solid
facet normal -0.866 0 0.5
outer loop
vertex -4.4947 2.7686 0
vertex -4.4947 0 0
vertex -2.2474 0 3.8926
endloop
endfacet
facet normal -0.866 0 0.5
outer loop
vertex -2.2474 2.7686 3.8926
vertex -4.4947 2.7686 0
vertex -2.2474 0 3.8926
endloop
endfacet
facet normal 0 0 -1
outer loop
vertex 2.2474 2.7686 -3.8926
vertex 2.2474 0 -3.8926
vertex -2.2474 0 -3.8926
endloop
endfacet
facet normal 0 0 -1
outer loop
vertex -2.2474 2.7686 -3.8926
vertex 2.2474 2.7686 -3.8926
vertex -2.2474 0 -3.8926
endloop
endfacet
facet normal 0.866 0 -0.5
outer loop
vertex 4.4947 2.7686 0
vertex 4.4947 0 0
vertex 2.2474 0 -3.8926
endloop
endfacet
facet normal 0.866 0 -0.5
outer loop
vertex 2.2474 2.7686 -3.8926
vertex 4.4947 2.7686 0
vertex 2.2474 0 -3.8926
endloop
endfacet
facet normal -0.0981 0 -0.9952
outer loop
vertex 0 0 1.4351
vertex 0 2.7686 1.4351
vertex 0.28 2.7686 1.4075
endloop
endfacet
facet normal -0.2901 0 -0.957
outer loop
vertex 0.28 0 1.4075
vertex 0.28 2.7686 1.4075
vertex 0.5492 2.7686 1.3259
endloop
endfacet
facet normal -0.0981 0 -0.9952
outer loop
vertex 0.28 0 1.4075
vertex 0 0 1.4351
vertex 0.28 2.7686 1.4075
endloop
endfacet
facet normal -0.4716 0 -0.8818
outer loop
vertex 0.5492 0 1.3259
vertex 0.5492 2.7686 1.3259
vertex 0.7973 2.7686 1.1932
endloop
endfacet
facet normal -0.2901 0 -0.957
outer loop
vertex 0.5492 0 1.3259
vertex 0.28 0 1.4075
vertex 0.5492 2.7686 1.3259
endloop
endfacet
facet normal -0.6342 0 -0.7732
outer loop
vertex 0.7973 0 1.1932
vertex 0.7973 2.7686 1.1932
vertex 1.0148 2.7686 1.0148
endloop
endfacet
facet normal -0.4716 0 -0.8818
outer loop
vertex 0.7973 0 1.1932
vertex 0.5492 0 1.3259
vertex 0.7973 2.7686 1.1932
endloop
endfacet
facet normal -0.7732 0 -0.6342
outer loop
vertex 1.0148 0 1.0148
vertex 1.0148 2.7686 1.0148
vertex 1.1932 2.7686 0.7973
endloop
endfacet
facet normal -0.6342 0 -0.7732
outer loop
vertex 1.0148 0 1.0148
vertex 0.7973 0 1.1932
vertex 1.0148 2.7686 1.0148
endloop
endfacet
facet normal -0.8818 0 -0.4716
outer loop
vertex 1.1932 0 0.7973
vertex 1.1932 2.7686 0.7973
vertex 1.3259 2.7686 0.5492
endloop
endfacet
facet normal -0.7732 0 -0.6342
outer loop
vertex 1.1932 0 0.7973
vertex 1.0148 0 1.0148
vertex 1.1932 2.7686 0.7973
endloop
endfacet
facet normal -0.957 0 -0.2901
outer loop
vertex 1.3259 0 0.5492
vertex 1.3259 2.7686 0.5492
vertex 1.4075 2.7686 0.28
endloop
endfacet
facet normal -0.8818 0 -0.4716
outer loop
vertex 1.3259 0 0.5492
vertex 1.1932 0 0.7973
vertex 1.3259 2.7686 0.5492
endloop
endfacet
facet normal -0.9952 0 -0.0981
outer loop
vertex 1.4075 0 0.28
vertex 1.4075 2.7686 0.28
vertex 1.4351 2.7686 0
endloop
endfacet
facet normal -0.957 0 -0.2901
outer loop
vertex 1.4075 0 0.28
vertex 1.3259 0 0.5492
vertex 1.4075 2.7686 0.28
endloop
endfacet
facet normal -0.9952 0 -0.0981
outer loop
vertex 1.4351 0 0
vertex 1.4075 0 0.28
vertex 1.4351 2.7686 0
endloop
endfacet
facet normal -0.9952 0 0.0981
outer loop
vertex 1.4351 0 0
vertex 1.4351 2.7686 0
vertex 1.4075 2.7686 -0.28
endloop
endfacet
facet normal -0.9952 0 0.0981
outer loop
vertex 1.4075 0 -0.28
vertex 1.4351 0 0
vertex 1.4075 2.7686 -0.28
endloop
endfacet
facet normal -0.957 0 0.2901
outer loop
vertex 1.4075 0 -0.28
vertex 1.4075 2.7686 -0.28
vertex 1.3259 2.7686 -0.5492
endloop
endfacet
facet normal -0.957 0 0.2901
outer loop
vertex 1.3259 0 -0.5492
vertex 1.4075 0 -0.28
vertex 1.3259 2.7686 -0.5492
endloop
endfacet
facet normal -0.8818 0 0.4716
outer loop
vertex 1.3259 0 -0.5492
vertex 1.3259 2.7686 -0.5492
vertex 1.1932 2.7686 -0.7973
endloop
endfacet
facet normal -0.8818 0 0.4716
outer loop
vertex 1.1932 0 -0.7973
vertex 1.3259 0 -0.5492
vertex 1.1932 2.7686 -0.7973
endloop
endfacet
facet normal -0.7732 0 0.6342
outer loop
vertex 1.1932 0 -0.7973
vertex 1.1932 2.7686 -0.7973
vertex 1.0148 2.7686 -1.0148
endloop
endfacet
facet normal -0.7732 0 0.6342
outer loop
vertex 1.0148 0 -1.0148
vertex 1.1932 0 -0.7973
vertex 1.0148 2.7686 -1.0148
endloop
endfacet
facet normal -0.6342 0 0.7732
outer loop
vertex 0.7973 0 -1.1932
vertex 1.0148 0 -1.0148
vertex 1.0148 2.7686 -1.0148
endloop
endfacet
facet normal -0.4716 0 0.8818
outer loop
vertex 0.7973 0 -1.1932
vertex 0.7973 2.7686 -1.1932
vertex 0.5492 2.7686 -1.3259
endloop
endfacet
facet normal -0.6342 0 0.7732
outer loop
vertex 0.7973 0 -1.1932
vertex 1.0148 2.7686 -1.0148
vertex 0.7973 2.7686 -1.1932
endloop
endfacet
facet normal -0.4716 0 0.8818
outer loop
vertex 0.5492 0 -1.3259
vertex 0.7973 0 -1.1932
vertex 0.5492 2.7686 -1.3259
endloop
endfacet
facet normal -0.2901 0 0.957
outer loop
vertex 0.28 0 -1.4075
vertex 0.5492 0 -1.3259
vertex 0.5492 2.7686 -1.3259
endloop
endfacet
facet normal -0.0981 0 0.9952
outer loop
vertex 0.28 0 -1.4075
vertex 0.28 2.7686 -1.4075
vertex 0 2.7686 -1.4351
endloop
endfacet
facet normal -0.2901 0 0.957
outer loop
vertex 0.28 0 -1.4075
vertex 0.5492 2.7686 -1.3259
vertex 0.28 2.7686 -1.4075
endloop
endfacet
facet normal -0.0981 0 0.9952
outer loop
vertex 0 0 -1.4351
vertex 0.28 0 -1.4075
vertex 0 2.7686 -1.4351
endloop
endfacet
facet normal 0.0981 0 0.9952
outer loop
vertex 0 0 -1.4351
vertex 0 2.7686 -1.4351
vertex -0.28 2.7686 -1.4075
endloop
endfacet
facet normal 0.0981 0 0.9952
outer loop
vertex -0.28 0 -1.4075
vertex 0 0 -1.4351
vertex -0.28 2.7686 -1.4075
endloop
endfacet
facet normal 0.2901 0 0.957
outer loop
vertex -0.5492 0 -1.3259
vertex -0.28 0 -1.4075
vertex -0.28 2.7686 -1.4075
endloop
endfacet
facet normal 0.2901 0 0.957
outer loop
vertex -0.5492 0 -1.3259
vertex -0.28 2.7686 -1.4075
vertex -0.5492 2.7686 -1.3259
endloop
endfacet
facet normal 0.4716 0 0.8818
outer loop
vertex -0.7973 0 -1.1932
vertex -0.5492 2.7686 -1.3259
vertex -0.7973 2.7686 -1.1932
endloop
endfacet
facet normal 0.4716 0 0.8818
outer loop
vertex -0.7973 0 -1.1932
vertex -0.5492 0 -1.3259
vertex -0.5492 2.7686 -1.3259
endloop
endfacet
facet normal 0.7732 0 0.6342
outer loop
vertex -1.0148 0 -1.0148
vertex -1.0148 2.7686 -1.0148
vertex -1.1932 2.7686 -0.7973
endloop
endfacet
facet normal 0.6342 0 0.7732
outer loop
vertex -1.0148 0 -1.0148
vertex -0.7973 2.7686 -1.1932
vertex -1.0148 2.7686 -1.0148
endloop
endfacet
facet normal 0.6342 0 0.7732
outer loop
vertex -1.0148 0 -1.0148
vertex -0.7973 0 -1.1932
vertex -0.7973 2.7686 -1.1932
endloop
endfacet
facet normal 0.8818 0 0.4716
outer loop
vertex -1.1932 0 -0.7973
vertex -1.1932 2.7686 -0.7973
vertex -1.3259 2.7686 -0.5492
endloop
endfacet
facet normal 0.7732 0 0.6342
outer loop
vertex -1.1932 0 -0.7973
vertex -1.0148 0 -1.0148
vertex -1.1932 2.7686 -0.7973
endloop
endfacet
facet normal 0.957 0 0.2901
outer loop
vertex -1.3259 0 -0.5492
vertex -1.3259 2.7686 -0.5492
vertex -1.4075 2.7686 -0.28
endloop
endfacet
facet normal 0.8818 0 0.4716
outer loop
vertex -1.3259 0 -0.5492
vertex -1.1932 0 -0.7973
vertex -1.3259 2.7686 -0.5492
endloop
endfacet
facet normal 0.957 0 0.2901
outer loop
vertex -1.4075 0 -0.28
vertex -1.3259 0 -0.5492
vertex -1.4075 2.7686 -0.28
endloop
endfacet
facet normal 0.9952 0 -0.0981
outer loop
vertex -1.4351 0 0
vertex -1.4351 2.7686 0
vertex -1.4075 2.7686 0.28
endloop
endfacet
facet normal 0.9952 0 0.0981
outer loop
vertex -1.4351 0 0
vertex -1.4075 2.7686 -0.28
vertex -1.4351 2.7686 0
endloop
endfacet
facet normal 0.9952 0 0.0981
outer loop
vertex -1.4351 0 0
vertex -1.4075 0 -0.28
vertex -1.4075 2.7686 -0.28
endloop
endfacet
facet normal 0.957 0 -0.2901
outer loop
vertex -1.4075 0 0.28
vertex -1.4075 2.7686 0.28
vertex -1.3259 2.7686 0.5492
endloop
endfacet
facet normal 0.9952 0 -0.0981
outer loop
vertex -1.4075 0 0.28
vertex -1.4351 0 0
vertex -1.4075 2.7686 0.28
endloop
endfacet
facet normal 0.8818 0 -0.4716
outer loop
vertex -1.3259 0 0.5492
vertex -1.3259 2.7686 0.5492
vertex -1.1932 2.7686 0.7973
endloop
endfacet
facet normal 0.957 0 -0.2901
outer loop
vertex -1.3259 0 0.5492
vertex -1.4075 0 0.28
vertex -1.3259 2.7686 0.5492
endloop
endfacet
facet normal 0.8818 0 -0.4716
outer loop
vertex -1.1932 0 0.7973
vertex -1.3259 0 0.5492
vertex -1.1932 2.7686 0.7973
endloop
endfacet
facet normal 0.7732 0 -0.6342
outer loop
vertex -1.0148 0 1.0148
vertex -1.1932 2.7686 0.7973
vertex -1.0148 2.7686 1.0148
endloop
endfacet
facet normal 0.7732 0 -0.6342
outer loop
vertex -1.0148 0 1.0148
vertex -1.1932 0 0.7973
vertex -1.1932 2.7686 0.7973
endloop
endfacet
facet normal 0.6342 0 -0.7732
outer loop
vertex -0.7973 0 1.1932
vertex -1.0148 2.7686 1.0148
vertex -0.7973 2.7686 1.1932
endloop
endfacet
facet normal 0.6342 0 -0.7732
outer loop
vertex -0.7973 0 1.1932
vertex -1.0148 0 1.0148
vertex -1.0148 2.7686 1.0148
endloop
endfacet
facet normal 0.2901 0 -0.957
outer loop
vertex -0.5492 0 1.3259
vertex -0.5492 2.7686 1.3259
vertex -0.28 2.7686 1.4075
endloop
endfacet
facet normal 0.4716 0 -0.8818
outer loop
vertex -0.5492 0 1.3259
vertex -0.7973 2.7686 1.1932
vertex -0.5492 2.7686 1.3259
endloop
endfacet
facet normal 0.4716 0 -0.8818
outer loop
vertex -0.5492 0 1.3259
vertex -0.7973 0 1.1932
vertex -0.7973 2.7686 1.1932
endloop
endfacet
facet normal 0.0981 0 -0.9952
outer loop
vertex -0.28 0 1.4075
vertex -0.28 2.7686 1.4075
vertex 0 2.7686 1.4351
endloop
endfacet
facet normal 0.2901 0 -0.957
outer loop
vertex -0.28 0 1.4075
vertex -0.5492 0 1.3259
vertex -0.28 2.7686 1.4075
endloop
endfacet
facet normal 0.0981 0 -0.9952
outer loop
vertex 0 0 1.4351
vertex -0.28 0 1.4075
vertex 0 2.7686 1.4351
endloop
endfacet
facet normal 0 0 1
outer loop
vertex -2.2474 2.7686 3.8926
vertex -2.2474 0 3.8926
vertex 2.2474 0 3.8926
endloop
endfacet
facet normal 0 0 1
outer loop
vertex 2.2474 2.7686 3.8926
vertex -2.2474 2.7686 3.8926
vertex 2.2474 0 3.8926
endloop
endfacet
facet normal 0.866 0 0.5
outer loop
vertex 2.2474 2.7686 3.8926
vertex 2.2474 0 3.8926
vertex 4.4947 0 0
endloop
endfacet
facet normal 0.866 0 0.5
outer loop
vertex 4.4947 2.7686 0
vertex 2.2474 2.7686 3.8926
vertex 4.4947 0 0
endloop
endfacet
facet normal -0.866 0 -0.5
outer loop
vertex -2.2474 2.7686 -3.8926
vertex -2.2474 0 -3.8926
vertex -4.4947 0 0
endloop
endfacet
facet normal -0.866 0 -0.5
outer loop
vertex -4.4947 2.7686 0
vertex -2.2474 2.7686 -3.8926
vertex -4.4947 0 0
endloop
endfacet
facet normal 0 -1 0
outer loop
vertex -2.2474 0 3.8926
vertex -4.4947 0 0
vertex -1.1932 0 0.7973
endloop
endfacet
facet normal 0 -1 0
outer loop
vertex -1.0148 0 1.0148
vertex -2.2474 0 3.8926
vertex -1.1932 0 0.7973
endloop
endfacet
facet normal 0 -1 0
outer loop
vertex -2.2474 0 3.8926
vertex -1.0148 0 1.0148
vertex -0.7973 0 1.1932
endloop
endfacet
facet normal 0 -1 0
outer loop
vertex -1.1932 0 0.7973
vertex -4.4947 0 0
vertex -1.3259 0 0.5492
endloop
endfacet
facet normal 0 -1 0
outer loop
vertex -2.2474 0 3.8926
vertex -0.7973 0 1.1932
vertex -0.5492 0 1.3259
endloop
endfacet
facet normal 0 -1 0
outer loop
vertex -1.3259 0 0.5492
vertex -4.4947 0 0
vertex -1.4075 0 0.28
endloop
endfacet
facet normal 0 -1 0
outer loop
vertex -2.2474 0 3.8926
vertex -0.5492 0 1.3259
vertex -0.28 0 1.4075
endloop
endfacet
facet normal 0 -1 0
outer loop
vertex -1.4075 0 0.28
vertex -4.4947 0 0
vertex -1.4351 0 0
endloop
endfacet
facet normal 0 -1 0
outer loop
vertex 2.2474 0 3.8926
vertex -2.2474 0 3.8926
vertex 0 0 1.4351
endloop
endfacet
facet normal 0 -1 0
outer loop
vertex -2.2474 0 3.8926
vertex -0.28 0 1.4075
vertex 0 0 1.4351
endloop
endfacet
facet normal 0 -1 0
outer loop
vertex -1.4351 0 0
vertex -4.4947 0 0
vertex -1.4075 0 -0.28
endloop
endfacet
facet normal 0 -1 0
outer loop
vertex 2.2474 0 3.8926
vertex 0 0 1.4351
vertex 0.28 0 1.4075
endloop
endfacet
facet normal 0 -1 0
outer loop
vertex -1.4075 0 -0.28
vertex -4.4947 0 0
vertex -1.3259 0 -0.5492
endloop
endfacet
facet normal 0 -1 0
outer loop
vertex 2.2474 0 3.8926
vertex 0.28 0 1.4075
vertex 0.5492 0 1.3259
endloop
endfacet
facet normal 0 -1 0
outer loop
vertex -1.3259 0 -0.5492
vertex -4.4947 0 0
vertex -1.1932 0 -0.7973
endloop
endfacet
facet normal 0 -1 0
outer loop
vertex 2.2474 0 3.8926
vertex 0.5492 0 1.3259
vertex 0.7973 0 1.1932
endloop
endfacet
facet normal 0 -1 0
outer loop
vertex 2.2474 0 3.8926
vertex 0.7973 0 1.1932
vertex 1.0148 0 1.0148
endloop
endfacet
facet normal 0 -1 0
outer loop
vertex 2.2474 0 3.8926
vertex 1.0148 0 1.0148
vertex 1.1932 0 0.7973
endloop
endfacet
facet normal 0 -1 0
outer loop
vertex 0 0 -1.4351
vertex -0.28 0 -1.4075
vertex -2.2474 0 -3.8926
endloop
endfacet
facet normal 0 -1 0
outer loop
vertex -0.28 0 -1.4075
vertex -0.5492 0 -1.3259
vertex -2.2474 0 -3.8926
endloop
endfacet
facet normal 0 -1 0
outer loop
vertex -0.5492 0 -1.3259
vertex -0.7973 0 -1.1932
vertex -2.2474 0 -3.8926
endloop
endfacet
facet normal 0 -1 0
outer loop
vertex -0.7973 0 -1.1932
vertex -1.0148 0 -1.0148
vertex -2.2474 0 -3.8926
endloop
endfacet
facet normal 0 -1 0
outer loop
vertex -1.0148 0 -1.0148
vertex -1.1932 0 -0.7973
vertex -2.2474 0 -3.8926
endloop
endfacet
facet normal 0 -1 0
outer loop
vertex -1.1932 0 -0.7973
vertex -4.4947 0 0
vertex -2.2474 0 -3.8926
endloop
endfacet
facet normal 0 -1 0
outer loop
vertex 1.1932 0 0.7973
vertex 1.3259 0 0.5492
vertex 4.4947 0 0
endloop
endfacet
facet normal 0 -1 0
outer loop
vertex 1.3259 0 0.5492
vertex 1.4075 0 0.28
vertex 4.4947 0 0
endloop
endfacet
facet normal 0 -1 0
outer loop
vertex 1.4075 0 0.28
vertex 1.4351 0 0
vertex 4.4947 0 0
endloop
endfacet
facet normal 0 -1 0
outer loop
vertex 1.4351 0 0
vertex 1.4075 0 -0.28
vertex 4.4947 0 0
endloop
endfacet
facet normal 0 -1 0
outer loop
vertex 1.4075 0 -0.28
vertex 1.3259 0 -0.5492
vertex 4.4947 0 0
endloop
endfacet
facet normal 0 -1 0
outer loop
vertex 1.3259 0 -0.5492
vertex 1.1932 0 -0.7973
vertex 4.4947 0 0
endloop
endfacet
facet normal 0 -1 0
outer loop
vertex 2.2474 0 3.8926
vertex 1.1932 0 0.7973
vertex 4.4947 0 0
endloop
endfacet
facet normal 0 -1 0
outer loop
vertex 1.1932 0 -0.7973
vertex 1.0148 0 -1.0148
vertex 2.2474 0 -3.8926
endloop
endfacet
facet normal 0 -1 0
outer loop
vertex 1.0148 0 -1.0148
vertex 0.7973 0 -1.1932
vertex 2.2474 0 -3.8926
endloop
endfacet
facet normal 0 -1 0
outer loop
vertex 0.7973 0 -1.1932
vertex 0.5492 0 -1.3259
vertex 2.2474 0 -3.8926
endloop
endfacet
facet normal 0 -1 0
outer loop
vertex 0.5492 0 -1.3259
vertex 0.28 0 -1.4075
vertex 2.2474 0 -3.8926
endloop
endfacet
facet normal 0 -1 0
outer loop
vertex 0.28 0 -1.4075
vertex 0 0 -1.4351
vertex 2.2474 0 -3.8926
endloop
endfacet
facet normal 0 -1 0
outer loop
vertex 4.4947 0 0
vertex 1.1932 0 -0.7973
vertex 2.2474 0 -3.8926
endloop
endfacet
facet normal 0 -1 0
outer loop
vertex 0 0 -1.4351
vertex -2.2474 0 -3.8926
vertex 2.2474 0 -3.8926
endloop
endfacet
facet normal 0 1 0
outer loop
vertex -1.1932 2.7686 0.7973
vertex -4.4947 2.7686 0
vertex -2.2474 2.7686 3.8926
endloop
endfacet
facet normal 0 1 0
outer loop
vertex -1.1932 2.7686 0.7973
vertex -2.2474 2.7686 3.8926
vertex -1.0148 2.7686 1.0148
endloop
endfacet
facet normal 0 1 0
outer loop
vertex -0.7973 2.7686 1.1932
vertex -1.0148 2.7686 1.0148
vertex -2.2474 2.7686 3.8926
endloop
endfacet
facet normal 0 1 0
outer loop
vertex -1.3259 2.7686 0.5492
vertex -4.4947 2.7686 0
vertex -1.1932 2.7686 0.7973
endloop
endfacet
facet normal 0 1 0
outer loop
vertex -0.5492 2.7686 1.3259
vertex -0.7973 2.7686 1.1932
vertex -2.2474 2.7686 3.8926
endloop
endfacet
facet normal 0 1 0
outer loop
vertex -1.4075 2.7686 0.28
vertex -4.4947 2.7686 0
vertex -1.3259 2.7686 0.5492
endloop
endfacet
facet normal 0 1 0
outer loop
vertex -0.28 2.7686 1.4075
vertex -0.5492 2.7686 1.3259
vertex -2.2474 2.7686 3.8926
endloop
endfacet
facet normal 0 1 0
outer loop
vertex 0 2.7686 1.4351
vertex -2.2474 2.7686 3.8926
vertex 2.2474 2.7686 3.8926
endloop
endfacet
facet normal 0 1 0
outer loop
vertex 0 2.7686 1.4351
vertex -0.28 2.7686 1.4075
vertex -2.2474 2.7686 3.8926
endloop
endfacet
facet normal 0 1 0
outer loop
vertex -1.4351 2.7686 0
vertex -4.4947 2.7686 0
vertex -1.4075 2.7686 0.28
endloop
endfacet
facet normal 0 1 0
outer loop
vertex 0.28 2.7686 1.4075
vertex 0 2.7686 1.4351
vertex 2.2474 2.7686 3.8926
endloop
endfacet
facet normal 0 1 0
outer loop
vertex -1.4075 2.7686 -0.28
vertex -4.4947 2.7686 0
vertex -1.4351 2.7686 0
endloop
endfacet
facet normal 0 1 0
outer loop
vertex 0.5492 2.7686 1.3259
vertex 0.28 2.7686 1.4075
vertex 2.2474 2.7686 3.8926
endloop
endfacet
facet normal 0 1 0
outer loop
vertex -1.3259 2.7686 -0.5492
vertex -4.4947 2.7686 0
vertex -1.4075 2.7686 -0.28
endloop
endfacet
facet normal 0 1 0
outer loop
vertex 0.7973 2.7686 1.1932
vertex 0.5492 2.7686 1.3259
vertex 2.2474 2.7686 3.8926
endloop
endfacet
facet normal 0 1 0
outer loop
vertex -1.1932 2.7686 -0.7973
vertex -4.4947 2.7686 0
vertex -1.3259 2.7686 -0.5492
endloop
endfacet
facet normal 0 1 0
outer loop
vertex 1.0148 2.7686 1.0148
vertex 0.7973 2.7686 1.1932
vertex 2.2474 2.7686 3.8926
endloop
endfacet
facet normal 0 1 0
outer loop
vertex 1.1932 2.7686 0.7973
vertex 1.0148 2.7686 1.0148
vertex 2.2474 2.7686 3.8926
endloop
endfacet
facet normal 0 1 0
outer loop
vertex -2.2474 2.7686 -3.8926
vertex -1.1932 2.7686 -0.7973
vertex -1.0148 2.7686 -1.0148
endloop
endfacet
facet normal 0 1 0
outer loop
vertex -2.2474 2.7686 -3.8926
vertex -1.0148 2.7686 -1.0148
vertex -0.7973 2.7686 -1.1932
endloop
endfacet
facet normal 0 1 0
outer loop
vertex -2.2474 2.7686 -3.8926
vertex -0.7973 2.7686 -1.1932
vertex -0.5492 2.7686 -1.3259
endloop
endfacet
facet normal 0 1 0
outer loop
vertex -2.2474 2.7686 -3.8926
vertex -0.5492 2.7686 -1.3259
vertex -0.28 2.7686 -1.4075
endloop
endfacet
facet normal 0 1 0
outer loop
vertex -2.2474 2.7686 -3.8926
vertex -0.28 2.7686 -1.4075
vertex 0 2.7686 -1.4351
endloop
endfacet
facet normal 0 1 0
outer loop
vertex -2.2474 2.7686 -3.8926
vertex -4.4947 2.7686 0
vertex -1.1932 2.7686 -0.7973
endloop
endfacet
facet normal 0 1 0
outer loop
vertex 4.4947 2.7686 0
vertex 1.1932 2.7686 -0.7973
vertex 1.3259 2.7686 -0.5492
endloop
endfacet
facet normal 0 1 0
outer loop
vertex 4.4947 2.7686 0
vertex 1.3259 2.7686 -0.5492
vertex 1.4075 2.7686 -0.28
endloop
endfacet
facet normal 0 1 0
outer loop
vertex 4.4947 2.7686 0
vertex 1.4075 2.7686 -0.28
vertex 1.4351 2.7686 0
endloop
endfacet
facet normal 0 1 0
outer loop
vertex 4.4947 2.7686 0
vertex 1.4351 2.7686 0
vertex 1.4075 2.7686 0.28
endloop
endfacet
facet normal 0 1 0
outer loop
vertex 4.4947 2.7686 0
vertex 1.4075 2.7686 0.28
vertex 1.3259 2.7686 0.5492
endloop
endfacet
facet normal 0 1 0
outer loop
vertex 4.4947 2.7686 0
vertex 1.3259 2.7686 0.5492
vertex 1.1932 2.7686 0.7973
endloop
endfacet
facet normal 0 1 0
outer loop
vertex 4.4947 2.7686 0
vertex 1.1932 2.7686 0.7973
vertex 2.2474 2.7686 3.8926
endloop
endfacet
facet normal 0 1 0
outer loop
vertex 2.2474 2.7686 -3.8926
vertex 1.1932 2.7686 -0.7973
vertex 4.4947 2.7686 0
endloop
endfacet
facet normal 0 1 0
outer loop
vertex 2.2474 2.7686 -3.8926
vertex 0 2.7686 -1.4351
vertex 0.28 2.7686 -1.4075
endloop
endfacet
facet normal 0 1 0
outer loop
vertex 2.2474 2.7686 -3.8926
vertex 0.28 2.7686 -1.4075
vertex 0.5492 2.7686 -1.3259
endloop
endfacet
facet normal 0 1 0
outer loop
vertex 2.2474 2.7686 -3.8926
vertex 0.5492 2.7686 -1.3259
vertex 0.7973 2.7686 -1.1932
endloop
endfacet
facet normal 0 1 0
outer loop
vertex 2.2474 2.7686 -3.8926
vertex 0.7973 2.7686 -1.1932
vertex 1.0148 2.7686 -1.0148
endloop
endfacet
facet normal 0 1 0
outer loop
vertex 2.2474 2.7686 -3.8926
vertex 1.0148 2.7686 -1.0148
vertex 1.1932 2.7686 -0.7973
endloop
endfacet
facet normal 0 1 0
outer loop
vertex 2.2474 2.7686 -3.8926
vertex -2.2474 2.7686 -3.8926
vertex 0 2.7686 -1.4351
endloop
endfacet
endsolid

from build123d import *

# Parameters (mm, degrees)
BOSS_EXTRUDE1_DEPTH = 2.7686
SKETCH2_R           = 1.4351
CUT_EXTRUDE2_DEPTH  = 7.558939355


with BuildPart() as part:
    # Sketch1 → Boss-Extrude1 (new body)
    with BuildSketch(Plane(origin=(0, 0, 0), x_dir=(1, 0, 0), z_dir=(0, 1, 0))):
        Polygon((-2.24736479, 3.89255), (-4.494729581, 0), (-2.24736479, -3.89255), (2.24736479, -3.89255), (4.494729581, 0), (2.24736479, 3.89255), align=None)
    extrude(amount=BOSS_EXTRUDE1_DEPTH)

    # Sketch2 → Cut-Extrude2 (cut, through all)
    with BuildSketch(Plane(origin=(0, 0, 0), x_dir=(1, 0, 0), z_dir=(0, 1, 0))):
        with Locations(Location((0, 0, 0), (0, 0, 270))):
            Circle(SKETCH2_R)
    extrude(amount=CUT_EXTRUDE2_DEPTH, mode=Mode.SUBTRACT)


solid = part.part
